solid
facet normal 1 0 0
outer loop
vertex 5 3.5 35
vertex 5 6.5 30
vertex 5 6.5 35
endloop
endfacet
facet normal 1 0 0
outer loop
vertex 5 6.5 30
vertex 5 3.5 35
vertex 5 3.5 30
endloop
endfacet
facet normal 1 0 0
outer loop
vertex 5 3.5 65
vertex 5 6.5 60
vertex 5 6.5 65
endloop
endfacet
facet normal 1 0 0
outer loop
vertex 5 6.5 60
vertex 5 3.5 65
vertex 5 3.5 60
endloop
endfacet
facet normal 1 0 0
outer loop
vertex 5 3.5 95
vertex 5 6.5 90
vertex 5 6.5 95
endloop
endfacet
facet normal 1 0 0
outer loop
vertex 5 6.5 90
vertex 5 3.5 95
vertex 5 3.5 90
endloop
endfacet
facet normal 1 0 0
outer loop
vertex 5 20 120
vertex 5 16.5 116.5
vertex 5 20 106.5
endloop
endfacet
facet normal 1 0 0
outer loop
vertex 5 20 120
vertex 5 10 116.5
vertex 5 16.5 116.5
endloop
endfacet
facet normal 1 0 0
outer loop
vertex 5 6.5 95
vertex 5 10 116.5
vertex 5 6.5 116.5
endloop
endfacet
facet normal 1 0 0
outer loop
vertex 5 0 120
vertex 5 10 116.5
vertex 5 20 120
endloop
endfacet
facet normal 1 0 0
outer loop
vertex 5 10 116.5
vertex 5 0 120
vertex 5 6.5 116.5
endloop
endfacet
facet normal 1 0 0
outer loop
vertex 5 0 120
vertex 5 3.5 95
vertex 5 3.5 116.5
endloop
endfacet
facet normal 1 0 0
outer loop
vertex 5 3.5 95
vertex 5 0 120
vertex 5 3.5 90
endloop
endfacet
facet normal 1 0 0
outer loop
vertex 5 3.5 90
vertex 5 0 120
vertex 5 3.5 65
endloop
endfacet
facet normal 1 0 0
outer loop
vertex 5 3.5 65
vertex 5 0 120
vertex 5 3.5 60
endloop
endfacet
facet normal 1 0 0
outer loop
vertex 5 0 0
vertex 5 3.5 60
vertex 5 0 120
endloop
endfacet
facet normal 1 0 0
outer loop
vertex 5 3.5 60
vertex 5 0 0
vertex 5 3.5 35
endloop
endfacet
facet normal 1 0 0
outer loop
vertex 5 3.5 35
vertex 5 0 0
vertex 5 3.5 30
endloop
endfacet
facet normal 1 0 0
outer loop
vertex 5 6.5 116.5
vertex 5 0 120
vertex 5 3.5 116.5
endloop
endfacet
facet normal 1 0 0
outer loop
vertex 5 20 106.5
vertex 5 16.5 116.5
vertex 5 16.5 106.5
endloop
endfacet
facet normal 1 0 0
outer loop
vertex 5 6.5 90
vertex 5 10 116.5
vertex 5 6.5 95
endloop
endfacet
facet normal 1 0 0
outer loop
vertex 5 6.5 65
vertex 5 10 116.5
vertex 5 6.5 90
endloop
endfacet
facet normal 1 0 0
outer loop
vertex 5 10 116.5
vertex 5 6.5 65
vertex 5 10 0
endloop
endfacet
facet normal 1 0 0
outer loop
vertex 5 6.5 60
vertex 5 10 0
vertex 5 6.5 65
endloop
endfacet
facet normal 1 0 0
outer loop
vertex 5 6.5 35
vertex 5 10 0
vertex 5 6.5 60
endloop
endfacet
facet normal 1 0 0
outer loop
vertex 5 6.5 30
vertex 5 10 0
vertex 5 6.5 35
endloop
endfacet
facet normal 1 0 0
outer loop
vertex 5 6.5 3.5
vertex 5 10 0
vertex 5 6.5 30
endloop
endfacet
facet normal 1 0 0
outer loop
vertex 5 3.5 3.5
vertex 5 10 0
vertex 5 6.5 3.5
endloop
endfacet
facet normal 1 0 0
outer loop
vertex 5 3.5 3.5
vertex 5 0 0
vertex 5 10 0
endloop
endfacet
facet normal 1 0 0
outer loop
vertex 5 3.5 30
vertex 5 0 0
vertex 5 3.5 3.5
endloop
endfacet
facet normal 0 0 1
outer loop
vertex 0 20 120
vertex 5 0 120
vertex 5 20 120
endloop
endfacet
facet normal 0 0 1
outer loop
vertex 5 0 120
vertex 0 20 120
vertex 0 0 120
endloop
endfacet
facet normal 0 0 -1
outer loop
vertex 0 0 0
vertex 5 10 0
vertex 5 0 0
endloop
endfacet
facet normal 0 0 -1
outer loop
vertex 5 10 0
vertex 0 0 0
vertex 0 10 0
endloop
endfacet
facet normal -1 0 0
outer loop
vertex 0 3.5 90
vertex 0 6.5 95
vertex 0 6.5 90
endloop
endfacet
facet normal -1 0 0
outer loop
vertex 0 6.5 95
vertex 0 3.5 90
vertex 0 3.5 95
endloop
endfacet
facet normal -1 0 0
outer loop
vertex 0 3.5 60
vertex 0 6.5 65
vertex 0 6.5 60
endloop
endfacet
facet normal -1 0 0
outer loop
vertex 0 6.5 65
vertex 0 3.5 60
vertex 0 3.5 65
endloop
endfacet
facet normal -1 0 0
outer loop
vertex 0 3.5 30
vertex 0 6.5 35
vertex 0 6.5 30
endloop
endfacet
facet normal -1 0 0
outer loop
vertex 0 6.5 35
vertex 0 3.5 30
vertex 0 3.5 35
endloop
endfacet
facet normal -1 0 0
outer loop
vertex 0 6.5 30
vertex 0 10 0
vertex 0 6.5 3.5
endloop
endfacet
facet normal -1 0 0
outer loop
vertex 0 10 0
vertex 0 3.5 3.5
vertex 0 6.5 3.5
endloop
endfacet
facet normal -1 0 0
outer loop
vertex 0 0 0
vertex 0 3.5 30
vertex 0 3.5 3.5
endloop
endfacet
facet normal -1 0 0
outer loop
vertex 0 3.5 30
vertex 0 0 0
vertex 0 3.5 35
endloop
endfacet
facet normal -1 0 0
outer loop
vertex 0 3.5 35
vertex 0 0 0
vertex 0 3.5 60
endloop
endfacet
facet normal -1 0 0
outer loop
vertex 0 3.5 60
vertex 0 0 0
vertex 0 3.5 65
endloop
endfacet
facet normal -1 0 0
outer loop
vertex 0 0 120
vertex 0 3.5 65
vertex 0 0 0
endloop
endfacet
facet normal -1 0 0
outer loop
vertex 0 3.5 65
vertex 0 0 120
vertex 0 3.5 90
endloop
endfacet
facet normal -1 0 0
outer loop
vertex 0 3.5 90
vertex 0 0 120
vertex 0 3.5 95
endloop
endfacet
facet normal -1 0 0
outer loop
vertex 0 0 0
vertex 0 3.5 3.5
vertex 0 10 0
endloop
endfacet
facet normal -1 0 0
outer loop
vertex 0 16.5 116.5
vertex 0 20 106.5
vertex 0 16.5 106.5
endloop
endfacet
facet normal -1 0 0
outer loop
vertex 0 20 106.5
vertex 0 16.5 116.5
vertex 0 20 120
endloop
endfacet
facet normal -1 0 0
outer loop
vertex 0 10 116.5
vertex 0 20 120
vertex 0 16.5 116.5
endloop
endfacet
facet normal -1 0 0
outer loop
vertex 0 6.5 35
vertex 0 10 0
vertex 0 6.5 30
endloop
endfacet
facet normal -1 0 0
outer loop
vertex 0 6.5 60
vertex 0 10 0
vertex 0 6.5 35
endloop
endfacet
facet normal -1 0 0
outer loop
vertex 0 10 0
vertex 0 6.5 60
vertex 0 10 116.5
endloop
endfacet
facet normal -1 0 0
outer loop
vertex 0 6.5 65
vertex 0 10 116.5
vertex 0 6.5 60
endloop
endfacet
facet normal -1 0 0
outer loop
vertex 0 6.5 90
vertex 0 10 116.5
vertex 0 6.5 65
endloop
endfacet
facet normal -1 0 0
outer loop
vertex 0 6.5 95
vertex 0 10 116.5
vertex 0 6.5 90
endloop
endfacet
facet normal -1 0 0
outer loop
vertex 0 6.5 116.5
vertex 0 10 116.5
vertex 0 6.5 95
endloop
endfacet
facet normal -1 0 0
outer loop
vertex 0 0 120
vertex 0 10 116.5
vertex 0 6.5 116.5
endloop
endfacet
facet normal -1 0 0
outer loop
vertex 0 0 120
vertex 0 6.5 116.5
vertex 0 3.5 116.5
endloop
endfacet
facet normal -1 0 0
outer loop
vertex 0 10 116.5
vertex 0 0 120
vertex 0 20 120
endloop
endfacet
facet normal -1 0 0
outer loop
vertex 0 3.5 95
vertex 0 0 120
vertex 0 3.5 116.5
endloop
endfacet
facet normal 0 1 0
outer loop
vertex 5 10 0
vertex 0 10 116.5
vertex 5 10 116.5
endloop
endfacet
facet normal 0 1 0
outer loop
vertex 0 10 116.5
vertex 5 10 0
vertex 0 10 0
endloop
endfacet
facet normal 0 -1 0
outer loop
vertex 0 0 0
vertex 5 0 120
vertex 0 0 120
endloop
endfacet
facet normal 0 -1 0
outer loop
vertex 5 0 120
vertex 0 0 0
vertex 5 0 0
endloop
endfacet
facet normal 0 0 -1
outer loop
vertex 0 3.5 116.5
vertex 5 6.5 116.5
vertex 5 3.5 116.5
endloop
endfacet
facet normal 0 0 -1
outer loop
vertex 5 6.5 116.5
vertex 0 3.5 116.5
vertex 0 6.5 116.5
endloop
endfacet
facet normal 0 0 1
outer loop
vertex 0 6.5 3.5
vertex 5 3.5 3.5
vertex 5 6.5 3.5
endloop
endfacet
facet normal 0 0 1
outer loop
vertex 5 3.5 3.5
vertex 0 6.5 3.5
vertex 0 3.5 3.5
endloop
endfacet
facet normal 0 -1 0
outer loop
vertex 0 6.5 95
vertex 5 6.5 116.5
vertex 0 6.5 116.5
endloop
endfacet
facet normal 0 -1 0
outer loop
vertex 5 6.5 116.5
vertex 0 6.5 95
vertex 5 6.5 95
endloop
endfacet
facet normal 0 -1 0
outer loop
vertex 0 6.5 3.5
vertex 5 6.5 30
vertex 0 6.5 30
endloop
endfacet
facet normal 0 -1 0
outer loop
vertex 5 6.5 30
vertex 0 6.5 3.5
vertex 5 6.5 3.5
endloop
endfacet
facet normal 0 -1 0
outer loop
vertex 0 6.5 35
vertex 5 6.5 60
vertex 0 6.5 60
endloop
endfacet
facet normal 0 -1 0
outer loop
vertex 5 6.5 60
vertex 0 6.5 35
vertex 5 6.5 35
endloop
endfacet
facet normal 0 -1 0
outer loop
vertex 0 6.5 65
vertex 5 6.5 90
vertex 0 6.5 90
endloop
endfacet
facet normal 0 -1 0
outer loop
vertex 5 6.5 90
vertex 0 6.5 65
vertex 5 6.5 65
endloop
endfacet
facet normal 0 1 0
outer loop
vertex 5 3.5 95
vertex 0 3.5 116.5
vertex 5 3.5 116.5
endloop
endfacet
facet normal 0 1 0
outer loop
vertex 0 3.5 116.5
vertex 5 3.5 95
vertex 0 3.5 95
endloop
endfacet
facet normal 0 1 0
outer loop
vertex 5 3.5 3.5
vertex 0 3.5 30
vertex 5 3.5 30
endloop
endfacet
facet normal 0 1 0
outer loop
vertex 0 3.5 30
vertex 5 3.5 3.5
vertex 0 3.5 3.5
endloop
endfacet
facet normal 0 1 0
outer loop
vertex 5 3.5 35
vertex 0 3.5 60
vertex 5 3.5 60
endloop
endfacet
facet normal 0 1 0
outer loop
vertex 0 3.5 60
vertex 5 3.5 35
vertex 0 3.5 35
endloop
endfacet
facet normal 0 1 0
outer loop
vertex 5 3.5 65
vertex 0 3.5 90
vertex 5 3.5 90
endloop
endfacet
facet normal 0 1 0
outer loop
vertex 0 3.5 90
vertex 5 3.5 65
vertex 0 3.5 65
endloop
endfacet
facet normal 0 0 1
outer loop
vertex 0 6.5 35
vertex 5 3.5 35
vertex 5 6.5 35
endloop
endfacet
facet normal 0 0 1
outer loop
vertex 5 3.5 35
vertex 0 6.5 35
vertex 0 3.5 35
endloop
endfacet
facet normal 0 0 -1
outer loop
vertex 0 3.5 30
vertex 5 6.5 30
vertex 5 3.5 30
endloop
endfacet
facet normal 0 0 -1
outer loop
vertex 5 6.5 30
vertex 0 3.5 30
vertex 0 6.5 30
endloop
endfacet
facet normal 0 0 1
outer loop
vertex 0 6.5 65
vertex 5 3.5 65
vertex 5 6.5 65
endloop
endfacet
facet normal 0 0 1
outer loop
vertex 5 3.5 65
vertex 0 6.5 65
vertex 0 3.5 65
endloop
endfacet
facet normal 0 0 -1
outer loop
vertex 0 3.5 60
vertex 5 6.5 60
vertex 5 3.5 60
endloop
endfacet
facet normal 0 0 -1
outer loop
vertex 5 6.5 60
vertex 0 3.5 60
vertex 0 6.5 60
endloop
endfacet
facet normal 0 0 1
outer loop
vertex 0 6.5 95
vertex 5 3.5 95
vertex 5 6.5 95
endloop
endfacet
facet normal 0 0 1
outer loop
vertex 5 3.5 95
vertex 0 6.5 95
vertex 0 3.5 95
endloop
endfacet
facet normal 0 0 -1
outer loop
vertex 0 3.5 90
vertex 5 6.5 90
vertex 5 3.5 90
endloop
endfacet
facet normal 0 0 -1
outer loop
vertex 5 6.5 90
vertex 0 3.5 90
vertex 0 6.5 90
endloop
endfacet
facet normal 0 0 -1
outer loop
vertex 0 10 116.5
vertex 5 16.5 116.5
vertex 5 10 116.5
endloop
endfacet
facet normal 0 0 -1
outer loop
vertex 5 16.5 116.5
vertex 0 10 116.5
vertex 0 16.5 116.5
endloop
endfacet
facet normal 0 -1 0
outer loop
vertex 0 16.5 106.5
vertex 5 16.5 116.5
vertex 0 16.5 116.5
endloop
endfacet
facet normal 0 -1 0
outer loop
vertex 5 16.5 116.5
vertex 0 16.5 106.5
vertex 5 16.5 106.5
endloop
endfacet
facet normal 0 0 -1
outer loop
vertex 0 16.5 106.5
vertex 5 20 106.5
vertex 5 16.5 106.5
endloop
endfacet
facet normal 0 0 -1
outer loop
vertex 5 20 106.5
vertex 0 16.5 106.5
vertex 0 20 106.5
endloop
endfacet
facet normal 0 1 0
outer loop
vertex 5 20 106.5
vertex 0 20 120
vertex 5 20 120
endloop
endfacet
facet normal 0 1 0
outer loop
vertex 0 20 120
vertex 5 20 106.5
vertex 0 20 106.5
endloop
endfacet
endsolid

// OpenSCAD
corner_radius = 0;

screw_bar_depth = 5;
screw_bar_width = 10;
screw_bar_height = 120;

blind_depth = 6.5;
blind_gap = 3.5;
blind_hook_height = 10;

screw_bar_margin = 3.5;

translate([corner_radius, corner_radius, corner_radius])
minkowski() {
  union() {
    difference() {
      cube([screw_bar_depth, screw_bar_width, screw_bar_height]);
      translate([0, screw_bar_margin, screw_bar_margin])
        cube([
          screw_bar_depth,
          screw_bar_width - screw_bar_margin * 2,
          screw_bar_height - screw_bar_margin * 2,
        ]);
    }

    translate([0, 0, screw_bar_height/4])
      cube([screw_bar_depth, screw_bar_width, 5]);

    translate([0, 0, 2*screw_bar_height/4])
      cube([screw_bar_depth, screw_bar_width, 5]);

    translate([0, 0, 3*screw_bar_height/4])
      cube([screw_bar_depth, screw_bar_width, 5]);

    translate([0, screw_bar_width, screw_bar_height - blind_gap])
      cube([screw_bar_depth, blind_depth, blind_gap]);

    translate([
      0,
      screw_bar_width + blind_depth,
      screw_bar_height - blind_gap - blind_hook_height
    ])
      cube([screw_bar_depth, blind_gap, blind_gap + blind_hook_height]);
  }
  sphere(r=corner_radius);
}
